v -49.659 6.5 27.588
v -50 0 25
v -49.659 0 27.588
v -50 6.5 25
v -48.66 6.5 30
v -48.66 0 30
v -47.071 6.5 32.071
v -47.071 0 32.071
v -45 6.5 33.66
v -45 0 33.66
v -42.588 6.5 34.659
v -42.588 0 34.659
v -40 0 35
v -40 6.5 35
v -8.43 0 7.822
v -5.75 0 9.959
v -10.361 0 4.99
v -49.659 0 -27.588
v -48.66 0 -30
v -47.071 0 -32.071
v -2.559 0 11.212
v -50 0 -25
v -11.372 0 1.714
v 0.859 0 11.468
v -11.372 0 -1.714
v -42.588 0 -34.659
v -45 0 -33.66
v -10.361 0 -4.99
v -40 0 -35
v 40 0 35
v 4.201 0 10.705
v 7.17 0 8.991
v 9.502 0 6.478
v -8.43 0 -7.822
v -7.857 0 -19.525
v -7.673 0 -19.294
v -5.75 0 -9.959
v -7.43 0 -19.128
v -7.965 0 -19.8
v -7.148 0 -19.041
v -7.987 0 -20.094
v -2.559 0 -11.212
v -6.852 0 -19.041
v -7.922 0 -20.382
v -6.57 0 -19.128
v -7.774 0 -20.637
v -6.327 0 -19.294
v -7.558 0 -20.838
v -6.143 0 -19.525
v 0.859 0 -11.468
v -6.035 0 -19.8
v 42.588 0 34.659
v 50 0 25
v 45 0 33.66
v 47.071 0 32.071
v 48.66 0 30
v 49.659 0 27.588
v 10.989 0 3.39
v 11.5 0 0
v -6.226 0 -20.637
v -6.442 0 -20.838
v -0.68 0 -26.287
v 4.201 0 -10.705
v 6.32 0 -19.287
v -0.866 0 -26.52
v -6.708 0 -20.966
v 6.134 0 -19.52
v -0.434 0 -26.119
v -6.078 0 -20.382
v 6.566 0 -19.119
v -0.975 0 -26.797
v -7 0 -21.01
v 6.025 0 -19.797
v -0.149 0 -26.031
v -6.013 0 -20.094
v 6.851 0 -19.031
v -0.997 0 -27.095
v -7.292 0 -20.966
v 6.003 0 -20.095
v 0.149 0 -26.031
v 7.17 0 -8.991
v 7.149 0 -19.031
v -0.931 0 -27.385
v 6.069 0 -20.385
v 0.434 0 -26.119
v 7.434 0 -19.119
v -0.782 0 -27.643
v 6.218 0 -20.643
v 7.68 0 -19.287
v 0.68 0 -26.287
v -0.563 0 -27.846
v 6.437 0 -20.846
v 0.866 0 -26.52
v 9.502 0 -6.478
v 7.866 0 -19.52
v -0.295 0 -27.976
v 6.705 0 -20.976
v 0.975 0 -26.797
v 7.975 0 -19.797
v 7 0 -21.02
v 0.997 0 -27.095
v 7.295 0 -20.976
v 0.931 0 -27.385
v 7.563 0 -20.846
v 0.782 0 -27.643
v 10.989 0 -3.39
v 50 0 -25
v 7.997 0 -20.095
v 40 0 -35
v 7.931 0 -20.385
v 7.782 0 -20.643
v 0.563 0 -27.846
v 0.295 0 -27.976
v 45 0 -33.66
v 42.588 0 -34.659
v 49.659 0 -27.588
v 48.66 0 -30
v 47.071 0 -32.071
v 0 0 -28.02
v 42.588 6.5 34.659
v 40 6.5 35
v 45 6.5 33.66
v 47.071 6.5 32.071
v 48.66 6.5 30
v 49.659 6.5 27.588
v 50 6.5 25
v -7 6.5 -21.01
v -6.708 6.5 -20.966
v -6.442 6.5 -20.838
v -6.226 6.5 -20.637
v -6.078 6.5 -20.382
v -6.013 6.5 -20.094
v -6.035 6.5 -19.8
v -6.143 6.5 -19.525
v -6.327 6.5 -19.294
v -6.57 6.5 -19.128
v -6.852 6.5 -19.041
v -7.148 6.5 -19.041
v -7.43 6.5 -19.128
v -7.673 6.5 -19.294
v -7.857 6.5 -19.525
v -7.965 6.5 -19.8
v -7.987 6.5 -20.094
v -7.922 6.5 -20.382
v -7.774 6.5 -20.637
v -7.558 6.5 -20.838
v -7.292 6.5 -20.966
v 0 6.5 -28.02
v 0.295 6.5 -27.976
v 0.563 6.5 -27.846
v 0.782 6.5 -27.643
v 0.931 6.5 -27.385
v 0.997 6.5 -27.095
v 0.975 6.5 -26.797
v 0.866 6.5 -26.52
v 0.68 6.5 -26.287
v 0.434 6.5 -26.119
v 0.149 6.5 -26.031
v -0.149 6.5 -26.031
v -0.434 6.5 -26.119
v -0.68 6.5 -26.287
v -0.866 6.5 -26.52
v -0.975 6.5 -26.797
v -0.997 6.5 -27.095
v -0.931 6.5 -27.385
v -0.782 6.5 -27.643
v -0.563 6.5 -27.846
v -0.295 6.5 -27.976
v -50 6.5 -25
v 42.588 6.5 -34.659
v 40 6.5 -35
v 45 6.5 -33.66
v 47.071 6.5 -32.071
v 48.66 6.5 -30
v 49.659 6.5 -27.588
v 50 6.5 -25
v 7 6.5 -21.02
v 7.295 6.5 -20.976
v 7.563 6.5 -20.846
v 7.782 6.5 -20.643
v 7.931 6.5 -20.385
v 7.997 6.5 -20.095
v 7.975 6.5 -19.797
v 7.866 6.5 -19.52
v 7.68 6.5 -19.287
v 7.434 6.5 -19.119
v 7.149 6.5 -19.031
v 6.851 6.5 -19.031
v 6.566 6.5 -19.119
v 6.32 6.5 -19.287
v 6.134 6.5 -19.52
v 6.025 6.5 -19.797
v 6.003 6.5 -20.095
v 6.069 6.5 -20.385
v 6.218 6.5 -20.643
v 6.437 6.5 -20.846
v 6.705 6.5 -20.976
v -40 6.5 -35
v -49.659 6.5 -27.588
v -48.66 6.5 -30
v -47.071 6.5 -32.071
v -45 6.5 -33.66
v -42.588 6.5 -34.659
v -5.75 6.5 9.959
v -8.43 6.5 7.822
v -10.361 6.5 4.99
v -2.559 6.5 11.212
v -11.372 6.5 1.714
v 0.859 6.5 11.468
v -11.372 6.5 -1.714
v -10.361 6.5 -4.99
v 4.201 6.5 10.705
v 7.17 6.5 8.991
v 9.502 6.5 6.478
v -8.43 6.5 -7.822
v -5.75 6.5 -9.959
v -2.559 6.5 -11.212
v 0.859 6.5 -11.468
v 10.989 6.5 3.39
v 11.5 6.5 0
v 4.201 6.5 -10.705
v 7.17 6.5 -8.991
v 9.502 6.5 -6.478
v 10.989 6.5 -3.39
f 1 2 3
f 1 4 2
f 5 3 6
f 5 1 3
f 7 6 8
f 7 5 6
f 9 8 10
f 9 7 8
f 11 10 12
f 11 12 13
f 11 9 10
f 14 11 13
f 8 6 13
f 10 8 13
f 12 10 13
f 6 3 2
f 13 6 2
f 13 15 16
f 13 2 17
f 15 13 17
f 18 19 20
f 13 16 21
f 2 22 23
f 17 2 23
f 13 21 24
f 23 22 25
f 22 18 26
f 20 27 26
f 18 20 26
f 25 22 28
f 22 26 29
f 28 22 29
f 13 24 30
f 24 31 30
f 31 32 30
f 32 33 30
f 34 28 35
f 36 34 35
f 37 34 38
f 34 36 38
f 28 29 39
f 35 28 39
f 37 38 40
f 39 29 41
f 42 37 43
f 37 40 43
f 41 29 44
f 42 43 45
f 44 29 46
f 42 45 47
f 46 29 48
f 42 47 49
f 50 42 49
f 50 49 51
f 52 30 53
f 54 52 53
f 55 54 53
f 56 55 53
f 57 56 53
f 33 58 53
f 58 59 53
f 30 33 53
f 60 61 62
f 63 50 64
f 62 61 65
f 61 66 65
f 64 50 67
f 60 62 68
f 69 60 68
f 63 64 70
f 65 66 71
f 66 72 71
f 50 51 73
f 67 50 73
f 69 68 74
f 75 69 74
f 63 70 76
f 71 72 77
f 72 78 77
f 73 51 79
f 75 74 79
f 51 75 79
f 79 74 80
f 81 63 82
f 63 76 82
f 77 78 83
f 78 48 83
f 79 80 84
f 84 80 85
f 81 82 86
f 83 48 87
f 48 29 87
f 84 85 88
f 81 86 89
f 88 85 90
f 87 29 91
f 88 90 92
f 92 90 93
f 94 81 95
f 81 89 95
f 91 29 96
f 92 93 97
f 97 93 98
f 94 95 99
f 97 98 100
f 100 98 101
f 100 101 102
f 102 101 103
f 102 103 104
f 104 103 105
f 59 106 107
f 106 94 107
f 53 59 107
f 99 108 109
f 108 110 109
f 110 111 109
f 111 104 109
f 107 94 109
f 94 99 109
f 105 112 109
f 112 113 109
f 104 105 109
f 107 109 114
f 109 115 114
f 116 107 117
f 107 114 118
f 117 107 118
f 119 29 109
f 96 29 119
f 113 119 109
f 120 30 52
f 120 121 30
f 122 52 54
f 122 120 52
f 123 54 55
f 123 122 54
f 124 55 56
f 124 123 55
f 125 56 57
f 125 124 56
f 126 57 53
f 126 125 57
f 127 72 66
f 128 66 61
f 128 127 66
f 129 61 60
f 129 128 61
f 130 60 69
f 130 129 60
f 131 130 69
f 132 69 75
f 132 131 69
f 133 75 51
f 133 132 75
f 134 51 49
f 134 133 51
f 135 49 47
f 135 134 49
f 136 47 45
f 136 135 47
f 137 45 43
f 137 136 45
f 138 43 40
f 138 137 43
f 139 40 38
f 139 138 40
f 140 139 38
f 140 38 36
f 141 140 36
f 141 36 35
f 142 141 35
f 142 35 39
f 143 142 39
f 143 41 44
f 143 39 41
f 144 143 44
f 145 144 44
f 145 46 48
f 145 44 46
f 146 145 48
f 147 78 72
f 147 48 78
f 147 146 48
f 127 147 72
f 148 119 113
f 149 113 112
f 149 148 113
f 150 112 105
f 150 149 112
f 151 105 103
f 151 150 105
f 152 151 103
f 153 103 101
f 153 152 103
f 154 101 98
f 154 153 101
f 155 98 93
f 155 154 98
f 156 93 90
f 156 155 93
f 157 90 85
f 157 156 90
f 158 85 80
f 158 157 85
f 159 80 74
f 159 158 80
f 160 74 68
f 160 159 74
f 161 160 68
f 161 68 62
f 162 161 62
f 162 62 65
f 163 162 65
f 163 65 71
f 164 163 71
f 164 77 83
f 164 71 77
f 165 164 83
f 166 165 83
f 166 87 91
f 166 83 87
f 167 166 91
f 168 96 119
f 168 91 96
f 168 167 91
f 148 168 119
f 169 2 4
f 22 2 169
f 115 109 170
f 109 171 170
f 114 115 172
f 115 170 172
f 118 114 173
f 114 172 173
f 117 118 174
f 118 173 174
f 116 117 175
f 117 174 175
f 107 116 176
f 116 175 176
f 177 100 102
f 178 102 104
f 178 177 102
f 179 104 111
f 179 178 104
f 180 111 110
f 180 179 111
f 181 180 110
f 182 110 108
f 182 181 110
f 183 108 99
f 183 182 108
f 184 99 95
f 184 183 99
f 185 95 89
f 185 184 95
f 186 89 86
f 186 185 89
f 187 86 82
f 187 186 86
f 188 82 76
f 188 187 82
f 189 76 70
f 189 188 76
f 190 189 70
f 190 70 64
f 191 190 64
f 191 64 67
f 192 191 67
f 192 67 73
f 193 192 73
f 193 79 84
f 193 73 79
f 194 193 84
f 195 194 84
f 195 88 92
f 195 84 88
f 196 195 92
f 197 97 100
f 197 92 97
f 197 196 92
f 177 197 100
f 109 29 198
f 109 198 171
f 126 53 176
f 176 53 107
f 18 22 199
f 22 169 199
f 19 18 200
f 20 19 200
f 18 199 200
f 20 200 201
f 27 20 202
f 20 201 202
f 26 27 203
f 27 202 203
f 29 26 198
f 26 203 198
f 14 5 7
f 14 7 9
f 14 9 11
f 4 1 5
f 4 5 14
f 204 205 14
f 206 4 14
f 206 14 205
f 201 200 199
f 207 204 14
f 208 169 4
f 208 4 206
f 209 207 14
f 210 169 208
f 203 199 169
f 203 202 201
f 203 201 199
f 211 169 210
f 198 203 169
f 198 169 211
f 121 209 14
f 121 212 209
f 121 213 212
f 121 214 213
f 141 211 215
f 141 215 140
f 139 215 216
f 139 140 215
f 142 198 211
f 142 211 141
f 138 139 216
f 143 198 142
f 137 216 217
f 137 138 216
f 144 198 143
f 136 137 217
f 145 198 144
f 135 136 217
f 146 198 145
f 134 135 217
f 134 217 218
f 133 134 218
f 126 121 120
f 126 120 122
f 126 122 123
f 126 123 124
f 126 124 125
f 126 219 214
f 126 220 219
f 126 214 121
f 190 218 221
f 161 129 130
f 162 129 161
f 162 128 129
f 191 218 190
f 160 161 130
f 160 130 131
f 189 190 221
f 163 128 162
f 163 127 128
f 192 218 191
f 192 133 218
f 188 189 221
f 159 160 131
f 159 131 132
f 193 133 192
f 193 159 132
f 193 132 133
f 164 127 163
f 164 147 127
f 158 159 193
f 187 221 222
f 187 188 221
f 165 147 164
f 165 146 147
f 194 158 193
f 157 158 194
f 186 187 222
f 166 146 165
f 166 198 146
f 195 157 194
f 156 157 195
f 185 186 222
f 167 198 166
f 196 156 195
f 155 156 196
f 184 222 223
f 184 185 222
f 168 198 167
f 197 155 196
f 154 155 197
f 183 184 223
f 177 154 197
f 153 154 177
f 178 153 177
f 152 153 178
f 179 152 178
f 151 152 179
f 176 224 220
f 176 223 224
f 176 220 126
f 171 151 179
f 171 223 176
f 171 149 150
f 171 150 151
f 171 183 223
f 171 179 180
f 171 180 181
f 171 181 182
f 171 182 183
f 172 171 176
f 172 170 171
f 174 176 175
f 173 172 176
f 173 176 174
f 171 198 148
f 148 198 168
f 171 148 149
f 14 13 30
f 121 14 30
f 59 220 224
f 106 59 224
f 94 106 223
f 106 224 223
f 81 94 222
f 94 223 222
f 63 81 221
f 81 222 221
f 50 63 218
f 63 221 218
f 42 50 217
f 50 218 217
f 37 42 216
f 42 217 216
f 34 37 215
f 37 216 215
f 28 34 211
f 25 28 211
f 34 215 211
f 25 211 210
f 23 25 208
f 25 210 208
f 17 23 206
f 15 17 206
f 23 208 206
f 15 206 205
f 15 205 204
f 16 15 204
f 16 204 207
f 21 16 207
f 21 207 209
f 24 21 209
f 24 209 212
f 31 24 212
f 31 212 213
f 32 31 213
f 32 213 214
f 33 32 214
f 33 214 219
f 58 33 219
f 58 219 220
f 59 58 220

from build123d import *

# Parameters (mm, degrees)
SKETCH1_W           = 100
SKETCH1_H           = 70
BOSS_EXTRUDE1_DEPTH = 6.5
SKETCH2_R           = 11.5
CUT_EXTRUDE1_DEPTH  = 19
CUT_EXTRUDE2_DEPTH  = 8
FILLET1_R           = 10


with BuildPart() as part:
    # Sketch1 → Boss-Extrude1 (new body)
    with BuildSketch(Plane(origin=(0, 0, 0), x_dir=(1, 0, 0), z_dir=(0, 1, 0))):
        Rectangle(SKETCH1_W, SKETCH1_H)
    extrude(amount=BOSS_EXTRUDE1_DEPTH)

    # Sketch2 → Cut-Extrude1 (cut)
    with BuildSketch(Plane(origin=(10.212212675, 6.5, 1.842409503), x_dir=(1, 0, 0), z_dir=(0, 1, 0))):
        with Locations((-10.212212675, 1.842409503)):
            Circle(SKETCH2_R)
    extrude(amount=-CUT_EXTRUDE1_DEPTH, mode=Mode.SUBTRACT)

    # Sketch3 → Cut-Extrude2 (cut)
    with BuildSketch(Plane(origin=(10.212212675, 6.5, 1.842409503), x_dir=(1, 0, 0), z_dir=(0, -1, 0))):
        with BuildLine():
            ThreePointArc((-17.21221269, -20.872409503), (-18.202212675, -21.862409519), (-17.212212659, -22.852409503))
            ThreePointArc((-17.212212659, -22.852409503), (-16.222212675, -21.862409488), (-17.21221269, -20.872409503))
        make_face()
        with BuildLine():
            ThreePointArc((-10.212212691, -27.862409503), (-11.212212675, -28.86240952), (-10.212212658, -29.862409503))
            ThreePointArc((-10.212212658, -29.862409503), (-9.212212675, -28.862409487), (-10.212212691, -27.862409503))
        make_face()
        with BuildLine():
            ThreePointArc((-3.212212691, -20.862409503), (-4.212212675, -21.86240952), (-3.212212658, -22.862409503))
            ThreePointArc((-3.212212658, -22.862409503), (-2.212212675, -21.862409487), (-3.212212691, -20.862409503))
        make_face()
    extrude(amount=CUT_EXTRUDE2_DEPTH, mode=Mode.SUBTRACT)

    # Fillet1
    fillet1_edges = [part.edges().sort_by_distance(p)[0] for p in [
        (-50, 3.25, -35),
        (50, 3.25, -35),
        (50, 3.25, 35),
        (-50, 3.25, 35),
    ]]
    fillet(fillet1_edges, radius=FILLET1_R)


solid = part.part
